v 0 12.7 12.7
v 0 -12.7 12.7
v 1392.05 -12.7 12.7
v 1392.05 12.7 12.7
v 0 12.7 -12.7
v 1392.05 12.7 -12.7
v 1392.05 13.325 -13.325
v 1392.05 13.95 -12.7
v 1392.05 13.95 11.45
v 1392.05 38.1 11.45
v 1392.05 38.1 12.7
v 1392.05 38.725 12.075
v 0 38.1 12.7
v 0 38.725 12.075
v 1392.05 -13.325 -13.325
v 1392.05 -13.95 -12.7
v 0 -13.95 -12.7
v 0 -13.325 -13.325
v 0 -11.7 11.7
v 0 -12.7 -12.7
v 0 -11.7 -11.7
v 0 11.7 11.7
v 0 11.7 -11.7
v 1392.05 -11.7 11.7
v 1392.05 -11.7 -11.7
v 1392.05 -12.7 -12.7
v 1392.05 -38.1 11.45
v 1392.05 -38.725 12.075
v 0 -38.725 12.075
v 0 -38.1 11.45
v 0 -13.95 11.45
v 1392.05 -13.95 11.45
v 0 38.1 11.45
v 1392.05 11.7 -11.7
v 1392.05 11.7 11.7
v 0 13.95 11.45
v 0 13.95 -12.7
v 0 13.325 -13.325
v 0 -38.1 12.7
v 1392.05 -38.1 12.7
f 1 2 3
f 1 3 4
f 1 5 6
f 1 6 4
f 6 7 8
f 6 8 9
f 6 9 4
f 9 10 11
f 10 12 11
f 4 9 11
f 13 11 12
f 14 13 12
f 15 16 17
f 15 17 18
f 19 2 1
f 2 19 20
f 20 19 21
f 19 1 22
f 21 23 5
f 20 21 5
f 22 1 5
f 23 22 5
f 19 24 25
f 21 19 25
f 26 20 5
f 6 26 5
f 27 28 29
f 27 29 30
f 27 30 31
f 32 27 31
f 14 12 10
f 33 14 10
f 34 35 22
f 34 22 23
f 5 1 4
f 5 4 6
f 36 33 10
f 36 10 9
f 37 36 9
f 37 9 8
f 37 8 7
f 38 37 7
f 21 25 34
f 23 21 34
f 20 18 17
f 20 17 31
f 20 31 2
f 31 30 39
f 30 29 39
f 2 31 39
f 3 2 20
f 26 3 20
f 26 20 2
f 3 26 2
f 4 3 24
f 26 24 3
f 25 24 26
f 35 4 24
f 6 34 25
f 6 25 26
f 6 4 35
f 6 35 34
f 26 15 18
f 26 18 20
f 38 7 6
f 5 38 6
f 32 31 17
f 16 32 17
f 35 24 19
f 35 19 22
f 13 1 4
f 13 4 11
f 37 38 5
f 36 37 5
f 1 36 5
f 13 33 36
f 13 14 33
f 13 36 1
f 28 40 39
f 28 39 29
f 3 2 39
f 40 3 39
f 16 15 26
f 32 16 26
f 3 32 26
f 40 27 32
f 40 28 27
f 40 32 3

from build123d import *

# Parameters (mm, degrees)
SKETCH1_W                                      = 25.4
SKETCH1_H                                      = 25.4
SKETCH1_W_2                                    = 23.4
SKETCH1_H_2                                    = 23.4
SQURE_TUBE_1X1SQUARE_TUBE_1_DEPTH              = 1392.049939
ANGLEIRON_ANGLE_IRON_ONE_BY_ONE_INCH_2ND_DEPTH = 1392.049939
ANGLEIRON_ANGLE_IRON_ONE_BY_ONE_INCH_2_DEPTH   = 1392.049939


with BuildPart() as part:
    # Sketch1 → Squre tube 1X1SQUARE TUBE(1) (new body)
    with BuildSketch(Plane(origin=(0, 0, 0), x_dir=(0, 0, -1), z_dir=(1, 0, 0))):
        Rectangle(SKETCH1_W, SKETCH1_H)
        Rectangle(SKETCH1_W_2, SKETCH1_H_2, mode=Mode.SUBTRACT)
    extrude(amount=SQURE_TUBE_1X1SQUARE_TUBE_1_DEPTH)


with BuildPart() as body_2:
    # Sketch13 → Angleiron ANGLE IRON ONE BY ONE INCH 2ND (new body)
    with BuildSketch(Plane(origin=(0, 12.7, 12.7), x_dir=(0, 0, -1), z_dir=(1, 0, 0))):
        Polygon((1.25, 25.4), (1.25, 1.25), (25.4, 1.25), (26.025, 0.625), (25.4, 0), (0, 0), (0, 25.4), (0.625, 26.025), align=None)
    extrude(amount=ANGLEIRON_ANGLE_IRON_ONE_BY_ONE_INCH_2ND_DEPTH)


with BuildPart() as body_3:
    # Sketch14 → Angleiron ANGLE IRON ONE BY ONE INCH 2 (new body)
    with BuildSketch(Plane(origin=(0, -12.7, 12.7), x_dir=(0, 0, -1), z_dir=(-1, 0, 0))):
        Polygon((1.25, 25.4), (1.25, 1.25), (25.4, 1.25), (26.025, 0.625), (25.4, 0), (0, 0), (0, 25.4), (0.625, 26.025), align=None)
    extrude(amount=-ANGLEIRON_ANGLE_IRON_ONE_BY_ONE_INCH_2_DEPTH)


solid = Compound([part.part, body_2.part, body_3.part])
